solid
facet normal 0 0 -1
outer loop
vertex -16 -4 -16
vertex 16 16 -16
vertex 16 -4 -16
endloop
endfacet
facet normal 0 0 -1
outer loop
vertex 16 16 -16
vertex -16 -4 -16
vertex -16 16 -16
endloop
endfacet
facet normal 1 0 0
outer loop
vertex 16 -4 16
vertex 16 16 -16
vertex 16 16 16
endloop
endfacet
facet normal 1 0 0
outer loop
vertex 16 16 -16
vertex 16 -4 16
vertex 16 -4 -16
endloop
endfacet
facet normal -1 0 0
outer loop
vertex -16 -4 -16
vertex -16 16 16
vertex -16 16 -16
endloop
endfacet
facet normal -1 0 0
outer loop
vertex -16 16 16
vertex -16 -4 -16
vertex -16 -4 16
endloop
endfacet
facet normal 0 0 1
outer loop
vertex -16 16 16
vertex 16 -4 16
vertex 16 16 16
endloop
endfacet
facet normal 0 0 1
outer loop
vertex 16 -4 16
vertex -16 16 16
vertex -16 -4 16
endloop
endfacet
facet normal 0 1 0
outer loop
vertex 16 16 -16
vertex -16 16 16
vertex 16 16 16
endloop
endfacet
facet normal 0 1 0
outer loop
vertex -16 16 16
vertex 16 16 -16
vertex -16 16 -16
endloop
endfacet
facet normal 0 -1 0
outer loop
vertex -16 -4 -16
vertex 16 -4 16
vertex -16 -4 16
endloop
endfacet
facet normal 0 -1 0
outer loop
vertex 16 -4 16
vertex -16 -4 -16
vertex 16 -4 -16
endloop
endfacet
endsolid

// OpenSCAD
size=32; //block=32 //item=8


rotate([0,90,0]){
//cube([size*0.8,size*0.8,size*0.8],center=true);
difference(){
cube([size*1,size*1,size*1],center=true);

union(){
translate([0,-size*0.375,0]){
cube([size*1*2,size*0.5,size*1*2],center=true);	//front
};	//translate
};	//union

};
};	//rotate
